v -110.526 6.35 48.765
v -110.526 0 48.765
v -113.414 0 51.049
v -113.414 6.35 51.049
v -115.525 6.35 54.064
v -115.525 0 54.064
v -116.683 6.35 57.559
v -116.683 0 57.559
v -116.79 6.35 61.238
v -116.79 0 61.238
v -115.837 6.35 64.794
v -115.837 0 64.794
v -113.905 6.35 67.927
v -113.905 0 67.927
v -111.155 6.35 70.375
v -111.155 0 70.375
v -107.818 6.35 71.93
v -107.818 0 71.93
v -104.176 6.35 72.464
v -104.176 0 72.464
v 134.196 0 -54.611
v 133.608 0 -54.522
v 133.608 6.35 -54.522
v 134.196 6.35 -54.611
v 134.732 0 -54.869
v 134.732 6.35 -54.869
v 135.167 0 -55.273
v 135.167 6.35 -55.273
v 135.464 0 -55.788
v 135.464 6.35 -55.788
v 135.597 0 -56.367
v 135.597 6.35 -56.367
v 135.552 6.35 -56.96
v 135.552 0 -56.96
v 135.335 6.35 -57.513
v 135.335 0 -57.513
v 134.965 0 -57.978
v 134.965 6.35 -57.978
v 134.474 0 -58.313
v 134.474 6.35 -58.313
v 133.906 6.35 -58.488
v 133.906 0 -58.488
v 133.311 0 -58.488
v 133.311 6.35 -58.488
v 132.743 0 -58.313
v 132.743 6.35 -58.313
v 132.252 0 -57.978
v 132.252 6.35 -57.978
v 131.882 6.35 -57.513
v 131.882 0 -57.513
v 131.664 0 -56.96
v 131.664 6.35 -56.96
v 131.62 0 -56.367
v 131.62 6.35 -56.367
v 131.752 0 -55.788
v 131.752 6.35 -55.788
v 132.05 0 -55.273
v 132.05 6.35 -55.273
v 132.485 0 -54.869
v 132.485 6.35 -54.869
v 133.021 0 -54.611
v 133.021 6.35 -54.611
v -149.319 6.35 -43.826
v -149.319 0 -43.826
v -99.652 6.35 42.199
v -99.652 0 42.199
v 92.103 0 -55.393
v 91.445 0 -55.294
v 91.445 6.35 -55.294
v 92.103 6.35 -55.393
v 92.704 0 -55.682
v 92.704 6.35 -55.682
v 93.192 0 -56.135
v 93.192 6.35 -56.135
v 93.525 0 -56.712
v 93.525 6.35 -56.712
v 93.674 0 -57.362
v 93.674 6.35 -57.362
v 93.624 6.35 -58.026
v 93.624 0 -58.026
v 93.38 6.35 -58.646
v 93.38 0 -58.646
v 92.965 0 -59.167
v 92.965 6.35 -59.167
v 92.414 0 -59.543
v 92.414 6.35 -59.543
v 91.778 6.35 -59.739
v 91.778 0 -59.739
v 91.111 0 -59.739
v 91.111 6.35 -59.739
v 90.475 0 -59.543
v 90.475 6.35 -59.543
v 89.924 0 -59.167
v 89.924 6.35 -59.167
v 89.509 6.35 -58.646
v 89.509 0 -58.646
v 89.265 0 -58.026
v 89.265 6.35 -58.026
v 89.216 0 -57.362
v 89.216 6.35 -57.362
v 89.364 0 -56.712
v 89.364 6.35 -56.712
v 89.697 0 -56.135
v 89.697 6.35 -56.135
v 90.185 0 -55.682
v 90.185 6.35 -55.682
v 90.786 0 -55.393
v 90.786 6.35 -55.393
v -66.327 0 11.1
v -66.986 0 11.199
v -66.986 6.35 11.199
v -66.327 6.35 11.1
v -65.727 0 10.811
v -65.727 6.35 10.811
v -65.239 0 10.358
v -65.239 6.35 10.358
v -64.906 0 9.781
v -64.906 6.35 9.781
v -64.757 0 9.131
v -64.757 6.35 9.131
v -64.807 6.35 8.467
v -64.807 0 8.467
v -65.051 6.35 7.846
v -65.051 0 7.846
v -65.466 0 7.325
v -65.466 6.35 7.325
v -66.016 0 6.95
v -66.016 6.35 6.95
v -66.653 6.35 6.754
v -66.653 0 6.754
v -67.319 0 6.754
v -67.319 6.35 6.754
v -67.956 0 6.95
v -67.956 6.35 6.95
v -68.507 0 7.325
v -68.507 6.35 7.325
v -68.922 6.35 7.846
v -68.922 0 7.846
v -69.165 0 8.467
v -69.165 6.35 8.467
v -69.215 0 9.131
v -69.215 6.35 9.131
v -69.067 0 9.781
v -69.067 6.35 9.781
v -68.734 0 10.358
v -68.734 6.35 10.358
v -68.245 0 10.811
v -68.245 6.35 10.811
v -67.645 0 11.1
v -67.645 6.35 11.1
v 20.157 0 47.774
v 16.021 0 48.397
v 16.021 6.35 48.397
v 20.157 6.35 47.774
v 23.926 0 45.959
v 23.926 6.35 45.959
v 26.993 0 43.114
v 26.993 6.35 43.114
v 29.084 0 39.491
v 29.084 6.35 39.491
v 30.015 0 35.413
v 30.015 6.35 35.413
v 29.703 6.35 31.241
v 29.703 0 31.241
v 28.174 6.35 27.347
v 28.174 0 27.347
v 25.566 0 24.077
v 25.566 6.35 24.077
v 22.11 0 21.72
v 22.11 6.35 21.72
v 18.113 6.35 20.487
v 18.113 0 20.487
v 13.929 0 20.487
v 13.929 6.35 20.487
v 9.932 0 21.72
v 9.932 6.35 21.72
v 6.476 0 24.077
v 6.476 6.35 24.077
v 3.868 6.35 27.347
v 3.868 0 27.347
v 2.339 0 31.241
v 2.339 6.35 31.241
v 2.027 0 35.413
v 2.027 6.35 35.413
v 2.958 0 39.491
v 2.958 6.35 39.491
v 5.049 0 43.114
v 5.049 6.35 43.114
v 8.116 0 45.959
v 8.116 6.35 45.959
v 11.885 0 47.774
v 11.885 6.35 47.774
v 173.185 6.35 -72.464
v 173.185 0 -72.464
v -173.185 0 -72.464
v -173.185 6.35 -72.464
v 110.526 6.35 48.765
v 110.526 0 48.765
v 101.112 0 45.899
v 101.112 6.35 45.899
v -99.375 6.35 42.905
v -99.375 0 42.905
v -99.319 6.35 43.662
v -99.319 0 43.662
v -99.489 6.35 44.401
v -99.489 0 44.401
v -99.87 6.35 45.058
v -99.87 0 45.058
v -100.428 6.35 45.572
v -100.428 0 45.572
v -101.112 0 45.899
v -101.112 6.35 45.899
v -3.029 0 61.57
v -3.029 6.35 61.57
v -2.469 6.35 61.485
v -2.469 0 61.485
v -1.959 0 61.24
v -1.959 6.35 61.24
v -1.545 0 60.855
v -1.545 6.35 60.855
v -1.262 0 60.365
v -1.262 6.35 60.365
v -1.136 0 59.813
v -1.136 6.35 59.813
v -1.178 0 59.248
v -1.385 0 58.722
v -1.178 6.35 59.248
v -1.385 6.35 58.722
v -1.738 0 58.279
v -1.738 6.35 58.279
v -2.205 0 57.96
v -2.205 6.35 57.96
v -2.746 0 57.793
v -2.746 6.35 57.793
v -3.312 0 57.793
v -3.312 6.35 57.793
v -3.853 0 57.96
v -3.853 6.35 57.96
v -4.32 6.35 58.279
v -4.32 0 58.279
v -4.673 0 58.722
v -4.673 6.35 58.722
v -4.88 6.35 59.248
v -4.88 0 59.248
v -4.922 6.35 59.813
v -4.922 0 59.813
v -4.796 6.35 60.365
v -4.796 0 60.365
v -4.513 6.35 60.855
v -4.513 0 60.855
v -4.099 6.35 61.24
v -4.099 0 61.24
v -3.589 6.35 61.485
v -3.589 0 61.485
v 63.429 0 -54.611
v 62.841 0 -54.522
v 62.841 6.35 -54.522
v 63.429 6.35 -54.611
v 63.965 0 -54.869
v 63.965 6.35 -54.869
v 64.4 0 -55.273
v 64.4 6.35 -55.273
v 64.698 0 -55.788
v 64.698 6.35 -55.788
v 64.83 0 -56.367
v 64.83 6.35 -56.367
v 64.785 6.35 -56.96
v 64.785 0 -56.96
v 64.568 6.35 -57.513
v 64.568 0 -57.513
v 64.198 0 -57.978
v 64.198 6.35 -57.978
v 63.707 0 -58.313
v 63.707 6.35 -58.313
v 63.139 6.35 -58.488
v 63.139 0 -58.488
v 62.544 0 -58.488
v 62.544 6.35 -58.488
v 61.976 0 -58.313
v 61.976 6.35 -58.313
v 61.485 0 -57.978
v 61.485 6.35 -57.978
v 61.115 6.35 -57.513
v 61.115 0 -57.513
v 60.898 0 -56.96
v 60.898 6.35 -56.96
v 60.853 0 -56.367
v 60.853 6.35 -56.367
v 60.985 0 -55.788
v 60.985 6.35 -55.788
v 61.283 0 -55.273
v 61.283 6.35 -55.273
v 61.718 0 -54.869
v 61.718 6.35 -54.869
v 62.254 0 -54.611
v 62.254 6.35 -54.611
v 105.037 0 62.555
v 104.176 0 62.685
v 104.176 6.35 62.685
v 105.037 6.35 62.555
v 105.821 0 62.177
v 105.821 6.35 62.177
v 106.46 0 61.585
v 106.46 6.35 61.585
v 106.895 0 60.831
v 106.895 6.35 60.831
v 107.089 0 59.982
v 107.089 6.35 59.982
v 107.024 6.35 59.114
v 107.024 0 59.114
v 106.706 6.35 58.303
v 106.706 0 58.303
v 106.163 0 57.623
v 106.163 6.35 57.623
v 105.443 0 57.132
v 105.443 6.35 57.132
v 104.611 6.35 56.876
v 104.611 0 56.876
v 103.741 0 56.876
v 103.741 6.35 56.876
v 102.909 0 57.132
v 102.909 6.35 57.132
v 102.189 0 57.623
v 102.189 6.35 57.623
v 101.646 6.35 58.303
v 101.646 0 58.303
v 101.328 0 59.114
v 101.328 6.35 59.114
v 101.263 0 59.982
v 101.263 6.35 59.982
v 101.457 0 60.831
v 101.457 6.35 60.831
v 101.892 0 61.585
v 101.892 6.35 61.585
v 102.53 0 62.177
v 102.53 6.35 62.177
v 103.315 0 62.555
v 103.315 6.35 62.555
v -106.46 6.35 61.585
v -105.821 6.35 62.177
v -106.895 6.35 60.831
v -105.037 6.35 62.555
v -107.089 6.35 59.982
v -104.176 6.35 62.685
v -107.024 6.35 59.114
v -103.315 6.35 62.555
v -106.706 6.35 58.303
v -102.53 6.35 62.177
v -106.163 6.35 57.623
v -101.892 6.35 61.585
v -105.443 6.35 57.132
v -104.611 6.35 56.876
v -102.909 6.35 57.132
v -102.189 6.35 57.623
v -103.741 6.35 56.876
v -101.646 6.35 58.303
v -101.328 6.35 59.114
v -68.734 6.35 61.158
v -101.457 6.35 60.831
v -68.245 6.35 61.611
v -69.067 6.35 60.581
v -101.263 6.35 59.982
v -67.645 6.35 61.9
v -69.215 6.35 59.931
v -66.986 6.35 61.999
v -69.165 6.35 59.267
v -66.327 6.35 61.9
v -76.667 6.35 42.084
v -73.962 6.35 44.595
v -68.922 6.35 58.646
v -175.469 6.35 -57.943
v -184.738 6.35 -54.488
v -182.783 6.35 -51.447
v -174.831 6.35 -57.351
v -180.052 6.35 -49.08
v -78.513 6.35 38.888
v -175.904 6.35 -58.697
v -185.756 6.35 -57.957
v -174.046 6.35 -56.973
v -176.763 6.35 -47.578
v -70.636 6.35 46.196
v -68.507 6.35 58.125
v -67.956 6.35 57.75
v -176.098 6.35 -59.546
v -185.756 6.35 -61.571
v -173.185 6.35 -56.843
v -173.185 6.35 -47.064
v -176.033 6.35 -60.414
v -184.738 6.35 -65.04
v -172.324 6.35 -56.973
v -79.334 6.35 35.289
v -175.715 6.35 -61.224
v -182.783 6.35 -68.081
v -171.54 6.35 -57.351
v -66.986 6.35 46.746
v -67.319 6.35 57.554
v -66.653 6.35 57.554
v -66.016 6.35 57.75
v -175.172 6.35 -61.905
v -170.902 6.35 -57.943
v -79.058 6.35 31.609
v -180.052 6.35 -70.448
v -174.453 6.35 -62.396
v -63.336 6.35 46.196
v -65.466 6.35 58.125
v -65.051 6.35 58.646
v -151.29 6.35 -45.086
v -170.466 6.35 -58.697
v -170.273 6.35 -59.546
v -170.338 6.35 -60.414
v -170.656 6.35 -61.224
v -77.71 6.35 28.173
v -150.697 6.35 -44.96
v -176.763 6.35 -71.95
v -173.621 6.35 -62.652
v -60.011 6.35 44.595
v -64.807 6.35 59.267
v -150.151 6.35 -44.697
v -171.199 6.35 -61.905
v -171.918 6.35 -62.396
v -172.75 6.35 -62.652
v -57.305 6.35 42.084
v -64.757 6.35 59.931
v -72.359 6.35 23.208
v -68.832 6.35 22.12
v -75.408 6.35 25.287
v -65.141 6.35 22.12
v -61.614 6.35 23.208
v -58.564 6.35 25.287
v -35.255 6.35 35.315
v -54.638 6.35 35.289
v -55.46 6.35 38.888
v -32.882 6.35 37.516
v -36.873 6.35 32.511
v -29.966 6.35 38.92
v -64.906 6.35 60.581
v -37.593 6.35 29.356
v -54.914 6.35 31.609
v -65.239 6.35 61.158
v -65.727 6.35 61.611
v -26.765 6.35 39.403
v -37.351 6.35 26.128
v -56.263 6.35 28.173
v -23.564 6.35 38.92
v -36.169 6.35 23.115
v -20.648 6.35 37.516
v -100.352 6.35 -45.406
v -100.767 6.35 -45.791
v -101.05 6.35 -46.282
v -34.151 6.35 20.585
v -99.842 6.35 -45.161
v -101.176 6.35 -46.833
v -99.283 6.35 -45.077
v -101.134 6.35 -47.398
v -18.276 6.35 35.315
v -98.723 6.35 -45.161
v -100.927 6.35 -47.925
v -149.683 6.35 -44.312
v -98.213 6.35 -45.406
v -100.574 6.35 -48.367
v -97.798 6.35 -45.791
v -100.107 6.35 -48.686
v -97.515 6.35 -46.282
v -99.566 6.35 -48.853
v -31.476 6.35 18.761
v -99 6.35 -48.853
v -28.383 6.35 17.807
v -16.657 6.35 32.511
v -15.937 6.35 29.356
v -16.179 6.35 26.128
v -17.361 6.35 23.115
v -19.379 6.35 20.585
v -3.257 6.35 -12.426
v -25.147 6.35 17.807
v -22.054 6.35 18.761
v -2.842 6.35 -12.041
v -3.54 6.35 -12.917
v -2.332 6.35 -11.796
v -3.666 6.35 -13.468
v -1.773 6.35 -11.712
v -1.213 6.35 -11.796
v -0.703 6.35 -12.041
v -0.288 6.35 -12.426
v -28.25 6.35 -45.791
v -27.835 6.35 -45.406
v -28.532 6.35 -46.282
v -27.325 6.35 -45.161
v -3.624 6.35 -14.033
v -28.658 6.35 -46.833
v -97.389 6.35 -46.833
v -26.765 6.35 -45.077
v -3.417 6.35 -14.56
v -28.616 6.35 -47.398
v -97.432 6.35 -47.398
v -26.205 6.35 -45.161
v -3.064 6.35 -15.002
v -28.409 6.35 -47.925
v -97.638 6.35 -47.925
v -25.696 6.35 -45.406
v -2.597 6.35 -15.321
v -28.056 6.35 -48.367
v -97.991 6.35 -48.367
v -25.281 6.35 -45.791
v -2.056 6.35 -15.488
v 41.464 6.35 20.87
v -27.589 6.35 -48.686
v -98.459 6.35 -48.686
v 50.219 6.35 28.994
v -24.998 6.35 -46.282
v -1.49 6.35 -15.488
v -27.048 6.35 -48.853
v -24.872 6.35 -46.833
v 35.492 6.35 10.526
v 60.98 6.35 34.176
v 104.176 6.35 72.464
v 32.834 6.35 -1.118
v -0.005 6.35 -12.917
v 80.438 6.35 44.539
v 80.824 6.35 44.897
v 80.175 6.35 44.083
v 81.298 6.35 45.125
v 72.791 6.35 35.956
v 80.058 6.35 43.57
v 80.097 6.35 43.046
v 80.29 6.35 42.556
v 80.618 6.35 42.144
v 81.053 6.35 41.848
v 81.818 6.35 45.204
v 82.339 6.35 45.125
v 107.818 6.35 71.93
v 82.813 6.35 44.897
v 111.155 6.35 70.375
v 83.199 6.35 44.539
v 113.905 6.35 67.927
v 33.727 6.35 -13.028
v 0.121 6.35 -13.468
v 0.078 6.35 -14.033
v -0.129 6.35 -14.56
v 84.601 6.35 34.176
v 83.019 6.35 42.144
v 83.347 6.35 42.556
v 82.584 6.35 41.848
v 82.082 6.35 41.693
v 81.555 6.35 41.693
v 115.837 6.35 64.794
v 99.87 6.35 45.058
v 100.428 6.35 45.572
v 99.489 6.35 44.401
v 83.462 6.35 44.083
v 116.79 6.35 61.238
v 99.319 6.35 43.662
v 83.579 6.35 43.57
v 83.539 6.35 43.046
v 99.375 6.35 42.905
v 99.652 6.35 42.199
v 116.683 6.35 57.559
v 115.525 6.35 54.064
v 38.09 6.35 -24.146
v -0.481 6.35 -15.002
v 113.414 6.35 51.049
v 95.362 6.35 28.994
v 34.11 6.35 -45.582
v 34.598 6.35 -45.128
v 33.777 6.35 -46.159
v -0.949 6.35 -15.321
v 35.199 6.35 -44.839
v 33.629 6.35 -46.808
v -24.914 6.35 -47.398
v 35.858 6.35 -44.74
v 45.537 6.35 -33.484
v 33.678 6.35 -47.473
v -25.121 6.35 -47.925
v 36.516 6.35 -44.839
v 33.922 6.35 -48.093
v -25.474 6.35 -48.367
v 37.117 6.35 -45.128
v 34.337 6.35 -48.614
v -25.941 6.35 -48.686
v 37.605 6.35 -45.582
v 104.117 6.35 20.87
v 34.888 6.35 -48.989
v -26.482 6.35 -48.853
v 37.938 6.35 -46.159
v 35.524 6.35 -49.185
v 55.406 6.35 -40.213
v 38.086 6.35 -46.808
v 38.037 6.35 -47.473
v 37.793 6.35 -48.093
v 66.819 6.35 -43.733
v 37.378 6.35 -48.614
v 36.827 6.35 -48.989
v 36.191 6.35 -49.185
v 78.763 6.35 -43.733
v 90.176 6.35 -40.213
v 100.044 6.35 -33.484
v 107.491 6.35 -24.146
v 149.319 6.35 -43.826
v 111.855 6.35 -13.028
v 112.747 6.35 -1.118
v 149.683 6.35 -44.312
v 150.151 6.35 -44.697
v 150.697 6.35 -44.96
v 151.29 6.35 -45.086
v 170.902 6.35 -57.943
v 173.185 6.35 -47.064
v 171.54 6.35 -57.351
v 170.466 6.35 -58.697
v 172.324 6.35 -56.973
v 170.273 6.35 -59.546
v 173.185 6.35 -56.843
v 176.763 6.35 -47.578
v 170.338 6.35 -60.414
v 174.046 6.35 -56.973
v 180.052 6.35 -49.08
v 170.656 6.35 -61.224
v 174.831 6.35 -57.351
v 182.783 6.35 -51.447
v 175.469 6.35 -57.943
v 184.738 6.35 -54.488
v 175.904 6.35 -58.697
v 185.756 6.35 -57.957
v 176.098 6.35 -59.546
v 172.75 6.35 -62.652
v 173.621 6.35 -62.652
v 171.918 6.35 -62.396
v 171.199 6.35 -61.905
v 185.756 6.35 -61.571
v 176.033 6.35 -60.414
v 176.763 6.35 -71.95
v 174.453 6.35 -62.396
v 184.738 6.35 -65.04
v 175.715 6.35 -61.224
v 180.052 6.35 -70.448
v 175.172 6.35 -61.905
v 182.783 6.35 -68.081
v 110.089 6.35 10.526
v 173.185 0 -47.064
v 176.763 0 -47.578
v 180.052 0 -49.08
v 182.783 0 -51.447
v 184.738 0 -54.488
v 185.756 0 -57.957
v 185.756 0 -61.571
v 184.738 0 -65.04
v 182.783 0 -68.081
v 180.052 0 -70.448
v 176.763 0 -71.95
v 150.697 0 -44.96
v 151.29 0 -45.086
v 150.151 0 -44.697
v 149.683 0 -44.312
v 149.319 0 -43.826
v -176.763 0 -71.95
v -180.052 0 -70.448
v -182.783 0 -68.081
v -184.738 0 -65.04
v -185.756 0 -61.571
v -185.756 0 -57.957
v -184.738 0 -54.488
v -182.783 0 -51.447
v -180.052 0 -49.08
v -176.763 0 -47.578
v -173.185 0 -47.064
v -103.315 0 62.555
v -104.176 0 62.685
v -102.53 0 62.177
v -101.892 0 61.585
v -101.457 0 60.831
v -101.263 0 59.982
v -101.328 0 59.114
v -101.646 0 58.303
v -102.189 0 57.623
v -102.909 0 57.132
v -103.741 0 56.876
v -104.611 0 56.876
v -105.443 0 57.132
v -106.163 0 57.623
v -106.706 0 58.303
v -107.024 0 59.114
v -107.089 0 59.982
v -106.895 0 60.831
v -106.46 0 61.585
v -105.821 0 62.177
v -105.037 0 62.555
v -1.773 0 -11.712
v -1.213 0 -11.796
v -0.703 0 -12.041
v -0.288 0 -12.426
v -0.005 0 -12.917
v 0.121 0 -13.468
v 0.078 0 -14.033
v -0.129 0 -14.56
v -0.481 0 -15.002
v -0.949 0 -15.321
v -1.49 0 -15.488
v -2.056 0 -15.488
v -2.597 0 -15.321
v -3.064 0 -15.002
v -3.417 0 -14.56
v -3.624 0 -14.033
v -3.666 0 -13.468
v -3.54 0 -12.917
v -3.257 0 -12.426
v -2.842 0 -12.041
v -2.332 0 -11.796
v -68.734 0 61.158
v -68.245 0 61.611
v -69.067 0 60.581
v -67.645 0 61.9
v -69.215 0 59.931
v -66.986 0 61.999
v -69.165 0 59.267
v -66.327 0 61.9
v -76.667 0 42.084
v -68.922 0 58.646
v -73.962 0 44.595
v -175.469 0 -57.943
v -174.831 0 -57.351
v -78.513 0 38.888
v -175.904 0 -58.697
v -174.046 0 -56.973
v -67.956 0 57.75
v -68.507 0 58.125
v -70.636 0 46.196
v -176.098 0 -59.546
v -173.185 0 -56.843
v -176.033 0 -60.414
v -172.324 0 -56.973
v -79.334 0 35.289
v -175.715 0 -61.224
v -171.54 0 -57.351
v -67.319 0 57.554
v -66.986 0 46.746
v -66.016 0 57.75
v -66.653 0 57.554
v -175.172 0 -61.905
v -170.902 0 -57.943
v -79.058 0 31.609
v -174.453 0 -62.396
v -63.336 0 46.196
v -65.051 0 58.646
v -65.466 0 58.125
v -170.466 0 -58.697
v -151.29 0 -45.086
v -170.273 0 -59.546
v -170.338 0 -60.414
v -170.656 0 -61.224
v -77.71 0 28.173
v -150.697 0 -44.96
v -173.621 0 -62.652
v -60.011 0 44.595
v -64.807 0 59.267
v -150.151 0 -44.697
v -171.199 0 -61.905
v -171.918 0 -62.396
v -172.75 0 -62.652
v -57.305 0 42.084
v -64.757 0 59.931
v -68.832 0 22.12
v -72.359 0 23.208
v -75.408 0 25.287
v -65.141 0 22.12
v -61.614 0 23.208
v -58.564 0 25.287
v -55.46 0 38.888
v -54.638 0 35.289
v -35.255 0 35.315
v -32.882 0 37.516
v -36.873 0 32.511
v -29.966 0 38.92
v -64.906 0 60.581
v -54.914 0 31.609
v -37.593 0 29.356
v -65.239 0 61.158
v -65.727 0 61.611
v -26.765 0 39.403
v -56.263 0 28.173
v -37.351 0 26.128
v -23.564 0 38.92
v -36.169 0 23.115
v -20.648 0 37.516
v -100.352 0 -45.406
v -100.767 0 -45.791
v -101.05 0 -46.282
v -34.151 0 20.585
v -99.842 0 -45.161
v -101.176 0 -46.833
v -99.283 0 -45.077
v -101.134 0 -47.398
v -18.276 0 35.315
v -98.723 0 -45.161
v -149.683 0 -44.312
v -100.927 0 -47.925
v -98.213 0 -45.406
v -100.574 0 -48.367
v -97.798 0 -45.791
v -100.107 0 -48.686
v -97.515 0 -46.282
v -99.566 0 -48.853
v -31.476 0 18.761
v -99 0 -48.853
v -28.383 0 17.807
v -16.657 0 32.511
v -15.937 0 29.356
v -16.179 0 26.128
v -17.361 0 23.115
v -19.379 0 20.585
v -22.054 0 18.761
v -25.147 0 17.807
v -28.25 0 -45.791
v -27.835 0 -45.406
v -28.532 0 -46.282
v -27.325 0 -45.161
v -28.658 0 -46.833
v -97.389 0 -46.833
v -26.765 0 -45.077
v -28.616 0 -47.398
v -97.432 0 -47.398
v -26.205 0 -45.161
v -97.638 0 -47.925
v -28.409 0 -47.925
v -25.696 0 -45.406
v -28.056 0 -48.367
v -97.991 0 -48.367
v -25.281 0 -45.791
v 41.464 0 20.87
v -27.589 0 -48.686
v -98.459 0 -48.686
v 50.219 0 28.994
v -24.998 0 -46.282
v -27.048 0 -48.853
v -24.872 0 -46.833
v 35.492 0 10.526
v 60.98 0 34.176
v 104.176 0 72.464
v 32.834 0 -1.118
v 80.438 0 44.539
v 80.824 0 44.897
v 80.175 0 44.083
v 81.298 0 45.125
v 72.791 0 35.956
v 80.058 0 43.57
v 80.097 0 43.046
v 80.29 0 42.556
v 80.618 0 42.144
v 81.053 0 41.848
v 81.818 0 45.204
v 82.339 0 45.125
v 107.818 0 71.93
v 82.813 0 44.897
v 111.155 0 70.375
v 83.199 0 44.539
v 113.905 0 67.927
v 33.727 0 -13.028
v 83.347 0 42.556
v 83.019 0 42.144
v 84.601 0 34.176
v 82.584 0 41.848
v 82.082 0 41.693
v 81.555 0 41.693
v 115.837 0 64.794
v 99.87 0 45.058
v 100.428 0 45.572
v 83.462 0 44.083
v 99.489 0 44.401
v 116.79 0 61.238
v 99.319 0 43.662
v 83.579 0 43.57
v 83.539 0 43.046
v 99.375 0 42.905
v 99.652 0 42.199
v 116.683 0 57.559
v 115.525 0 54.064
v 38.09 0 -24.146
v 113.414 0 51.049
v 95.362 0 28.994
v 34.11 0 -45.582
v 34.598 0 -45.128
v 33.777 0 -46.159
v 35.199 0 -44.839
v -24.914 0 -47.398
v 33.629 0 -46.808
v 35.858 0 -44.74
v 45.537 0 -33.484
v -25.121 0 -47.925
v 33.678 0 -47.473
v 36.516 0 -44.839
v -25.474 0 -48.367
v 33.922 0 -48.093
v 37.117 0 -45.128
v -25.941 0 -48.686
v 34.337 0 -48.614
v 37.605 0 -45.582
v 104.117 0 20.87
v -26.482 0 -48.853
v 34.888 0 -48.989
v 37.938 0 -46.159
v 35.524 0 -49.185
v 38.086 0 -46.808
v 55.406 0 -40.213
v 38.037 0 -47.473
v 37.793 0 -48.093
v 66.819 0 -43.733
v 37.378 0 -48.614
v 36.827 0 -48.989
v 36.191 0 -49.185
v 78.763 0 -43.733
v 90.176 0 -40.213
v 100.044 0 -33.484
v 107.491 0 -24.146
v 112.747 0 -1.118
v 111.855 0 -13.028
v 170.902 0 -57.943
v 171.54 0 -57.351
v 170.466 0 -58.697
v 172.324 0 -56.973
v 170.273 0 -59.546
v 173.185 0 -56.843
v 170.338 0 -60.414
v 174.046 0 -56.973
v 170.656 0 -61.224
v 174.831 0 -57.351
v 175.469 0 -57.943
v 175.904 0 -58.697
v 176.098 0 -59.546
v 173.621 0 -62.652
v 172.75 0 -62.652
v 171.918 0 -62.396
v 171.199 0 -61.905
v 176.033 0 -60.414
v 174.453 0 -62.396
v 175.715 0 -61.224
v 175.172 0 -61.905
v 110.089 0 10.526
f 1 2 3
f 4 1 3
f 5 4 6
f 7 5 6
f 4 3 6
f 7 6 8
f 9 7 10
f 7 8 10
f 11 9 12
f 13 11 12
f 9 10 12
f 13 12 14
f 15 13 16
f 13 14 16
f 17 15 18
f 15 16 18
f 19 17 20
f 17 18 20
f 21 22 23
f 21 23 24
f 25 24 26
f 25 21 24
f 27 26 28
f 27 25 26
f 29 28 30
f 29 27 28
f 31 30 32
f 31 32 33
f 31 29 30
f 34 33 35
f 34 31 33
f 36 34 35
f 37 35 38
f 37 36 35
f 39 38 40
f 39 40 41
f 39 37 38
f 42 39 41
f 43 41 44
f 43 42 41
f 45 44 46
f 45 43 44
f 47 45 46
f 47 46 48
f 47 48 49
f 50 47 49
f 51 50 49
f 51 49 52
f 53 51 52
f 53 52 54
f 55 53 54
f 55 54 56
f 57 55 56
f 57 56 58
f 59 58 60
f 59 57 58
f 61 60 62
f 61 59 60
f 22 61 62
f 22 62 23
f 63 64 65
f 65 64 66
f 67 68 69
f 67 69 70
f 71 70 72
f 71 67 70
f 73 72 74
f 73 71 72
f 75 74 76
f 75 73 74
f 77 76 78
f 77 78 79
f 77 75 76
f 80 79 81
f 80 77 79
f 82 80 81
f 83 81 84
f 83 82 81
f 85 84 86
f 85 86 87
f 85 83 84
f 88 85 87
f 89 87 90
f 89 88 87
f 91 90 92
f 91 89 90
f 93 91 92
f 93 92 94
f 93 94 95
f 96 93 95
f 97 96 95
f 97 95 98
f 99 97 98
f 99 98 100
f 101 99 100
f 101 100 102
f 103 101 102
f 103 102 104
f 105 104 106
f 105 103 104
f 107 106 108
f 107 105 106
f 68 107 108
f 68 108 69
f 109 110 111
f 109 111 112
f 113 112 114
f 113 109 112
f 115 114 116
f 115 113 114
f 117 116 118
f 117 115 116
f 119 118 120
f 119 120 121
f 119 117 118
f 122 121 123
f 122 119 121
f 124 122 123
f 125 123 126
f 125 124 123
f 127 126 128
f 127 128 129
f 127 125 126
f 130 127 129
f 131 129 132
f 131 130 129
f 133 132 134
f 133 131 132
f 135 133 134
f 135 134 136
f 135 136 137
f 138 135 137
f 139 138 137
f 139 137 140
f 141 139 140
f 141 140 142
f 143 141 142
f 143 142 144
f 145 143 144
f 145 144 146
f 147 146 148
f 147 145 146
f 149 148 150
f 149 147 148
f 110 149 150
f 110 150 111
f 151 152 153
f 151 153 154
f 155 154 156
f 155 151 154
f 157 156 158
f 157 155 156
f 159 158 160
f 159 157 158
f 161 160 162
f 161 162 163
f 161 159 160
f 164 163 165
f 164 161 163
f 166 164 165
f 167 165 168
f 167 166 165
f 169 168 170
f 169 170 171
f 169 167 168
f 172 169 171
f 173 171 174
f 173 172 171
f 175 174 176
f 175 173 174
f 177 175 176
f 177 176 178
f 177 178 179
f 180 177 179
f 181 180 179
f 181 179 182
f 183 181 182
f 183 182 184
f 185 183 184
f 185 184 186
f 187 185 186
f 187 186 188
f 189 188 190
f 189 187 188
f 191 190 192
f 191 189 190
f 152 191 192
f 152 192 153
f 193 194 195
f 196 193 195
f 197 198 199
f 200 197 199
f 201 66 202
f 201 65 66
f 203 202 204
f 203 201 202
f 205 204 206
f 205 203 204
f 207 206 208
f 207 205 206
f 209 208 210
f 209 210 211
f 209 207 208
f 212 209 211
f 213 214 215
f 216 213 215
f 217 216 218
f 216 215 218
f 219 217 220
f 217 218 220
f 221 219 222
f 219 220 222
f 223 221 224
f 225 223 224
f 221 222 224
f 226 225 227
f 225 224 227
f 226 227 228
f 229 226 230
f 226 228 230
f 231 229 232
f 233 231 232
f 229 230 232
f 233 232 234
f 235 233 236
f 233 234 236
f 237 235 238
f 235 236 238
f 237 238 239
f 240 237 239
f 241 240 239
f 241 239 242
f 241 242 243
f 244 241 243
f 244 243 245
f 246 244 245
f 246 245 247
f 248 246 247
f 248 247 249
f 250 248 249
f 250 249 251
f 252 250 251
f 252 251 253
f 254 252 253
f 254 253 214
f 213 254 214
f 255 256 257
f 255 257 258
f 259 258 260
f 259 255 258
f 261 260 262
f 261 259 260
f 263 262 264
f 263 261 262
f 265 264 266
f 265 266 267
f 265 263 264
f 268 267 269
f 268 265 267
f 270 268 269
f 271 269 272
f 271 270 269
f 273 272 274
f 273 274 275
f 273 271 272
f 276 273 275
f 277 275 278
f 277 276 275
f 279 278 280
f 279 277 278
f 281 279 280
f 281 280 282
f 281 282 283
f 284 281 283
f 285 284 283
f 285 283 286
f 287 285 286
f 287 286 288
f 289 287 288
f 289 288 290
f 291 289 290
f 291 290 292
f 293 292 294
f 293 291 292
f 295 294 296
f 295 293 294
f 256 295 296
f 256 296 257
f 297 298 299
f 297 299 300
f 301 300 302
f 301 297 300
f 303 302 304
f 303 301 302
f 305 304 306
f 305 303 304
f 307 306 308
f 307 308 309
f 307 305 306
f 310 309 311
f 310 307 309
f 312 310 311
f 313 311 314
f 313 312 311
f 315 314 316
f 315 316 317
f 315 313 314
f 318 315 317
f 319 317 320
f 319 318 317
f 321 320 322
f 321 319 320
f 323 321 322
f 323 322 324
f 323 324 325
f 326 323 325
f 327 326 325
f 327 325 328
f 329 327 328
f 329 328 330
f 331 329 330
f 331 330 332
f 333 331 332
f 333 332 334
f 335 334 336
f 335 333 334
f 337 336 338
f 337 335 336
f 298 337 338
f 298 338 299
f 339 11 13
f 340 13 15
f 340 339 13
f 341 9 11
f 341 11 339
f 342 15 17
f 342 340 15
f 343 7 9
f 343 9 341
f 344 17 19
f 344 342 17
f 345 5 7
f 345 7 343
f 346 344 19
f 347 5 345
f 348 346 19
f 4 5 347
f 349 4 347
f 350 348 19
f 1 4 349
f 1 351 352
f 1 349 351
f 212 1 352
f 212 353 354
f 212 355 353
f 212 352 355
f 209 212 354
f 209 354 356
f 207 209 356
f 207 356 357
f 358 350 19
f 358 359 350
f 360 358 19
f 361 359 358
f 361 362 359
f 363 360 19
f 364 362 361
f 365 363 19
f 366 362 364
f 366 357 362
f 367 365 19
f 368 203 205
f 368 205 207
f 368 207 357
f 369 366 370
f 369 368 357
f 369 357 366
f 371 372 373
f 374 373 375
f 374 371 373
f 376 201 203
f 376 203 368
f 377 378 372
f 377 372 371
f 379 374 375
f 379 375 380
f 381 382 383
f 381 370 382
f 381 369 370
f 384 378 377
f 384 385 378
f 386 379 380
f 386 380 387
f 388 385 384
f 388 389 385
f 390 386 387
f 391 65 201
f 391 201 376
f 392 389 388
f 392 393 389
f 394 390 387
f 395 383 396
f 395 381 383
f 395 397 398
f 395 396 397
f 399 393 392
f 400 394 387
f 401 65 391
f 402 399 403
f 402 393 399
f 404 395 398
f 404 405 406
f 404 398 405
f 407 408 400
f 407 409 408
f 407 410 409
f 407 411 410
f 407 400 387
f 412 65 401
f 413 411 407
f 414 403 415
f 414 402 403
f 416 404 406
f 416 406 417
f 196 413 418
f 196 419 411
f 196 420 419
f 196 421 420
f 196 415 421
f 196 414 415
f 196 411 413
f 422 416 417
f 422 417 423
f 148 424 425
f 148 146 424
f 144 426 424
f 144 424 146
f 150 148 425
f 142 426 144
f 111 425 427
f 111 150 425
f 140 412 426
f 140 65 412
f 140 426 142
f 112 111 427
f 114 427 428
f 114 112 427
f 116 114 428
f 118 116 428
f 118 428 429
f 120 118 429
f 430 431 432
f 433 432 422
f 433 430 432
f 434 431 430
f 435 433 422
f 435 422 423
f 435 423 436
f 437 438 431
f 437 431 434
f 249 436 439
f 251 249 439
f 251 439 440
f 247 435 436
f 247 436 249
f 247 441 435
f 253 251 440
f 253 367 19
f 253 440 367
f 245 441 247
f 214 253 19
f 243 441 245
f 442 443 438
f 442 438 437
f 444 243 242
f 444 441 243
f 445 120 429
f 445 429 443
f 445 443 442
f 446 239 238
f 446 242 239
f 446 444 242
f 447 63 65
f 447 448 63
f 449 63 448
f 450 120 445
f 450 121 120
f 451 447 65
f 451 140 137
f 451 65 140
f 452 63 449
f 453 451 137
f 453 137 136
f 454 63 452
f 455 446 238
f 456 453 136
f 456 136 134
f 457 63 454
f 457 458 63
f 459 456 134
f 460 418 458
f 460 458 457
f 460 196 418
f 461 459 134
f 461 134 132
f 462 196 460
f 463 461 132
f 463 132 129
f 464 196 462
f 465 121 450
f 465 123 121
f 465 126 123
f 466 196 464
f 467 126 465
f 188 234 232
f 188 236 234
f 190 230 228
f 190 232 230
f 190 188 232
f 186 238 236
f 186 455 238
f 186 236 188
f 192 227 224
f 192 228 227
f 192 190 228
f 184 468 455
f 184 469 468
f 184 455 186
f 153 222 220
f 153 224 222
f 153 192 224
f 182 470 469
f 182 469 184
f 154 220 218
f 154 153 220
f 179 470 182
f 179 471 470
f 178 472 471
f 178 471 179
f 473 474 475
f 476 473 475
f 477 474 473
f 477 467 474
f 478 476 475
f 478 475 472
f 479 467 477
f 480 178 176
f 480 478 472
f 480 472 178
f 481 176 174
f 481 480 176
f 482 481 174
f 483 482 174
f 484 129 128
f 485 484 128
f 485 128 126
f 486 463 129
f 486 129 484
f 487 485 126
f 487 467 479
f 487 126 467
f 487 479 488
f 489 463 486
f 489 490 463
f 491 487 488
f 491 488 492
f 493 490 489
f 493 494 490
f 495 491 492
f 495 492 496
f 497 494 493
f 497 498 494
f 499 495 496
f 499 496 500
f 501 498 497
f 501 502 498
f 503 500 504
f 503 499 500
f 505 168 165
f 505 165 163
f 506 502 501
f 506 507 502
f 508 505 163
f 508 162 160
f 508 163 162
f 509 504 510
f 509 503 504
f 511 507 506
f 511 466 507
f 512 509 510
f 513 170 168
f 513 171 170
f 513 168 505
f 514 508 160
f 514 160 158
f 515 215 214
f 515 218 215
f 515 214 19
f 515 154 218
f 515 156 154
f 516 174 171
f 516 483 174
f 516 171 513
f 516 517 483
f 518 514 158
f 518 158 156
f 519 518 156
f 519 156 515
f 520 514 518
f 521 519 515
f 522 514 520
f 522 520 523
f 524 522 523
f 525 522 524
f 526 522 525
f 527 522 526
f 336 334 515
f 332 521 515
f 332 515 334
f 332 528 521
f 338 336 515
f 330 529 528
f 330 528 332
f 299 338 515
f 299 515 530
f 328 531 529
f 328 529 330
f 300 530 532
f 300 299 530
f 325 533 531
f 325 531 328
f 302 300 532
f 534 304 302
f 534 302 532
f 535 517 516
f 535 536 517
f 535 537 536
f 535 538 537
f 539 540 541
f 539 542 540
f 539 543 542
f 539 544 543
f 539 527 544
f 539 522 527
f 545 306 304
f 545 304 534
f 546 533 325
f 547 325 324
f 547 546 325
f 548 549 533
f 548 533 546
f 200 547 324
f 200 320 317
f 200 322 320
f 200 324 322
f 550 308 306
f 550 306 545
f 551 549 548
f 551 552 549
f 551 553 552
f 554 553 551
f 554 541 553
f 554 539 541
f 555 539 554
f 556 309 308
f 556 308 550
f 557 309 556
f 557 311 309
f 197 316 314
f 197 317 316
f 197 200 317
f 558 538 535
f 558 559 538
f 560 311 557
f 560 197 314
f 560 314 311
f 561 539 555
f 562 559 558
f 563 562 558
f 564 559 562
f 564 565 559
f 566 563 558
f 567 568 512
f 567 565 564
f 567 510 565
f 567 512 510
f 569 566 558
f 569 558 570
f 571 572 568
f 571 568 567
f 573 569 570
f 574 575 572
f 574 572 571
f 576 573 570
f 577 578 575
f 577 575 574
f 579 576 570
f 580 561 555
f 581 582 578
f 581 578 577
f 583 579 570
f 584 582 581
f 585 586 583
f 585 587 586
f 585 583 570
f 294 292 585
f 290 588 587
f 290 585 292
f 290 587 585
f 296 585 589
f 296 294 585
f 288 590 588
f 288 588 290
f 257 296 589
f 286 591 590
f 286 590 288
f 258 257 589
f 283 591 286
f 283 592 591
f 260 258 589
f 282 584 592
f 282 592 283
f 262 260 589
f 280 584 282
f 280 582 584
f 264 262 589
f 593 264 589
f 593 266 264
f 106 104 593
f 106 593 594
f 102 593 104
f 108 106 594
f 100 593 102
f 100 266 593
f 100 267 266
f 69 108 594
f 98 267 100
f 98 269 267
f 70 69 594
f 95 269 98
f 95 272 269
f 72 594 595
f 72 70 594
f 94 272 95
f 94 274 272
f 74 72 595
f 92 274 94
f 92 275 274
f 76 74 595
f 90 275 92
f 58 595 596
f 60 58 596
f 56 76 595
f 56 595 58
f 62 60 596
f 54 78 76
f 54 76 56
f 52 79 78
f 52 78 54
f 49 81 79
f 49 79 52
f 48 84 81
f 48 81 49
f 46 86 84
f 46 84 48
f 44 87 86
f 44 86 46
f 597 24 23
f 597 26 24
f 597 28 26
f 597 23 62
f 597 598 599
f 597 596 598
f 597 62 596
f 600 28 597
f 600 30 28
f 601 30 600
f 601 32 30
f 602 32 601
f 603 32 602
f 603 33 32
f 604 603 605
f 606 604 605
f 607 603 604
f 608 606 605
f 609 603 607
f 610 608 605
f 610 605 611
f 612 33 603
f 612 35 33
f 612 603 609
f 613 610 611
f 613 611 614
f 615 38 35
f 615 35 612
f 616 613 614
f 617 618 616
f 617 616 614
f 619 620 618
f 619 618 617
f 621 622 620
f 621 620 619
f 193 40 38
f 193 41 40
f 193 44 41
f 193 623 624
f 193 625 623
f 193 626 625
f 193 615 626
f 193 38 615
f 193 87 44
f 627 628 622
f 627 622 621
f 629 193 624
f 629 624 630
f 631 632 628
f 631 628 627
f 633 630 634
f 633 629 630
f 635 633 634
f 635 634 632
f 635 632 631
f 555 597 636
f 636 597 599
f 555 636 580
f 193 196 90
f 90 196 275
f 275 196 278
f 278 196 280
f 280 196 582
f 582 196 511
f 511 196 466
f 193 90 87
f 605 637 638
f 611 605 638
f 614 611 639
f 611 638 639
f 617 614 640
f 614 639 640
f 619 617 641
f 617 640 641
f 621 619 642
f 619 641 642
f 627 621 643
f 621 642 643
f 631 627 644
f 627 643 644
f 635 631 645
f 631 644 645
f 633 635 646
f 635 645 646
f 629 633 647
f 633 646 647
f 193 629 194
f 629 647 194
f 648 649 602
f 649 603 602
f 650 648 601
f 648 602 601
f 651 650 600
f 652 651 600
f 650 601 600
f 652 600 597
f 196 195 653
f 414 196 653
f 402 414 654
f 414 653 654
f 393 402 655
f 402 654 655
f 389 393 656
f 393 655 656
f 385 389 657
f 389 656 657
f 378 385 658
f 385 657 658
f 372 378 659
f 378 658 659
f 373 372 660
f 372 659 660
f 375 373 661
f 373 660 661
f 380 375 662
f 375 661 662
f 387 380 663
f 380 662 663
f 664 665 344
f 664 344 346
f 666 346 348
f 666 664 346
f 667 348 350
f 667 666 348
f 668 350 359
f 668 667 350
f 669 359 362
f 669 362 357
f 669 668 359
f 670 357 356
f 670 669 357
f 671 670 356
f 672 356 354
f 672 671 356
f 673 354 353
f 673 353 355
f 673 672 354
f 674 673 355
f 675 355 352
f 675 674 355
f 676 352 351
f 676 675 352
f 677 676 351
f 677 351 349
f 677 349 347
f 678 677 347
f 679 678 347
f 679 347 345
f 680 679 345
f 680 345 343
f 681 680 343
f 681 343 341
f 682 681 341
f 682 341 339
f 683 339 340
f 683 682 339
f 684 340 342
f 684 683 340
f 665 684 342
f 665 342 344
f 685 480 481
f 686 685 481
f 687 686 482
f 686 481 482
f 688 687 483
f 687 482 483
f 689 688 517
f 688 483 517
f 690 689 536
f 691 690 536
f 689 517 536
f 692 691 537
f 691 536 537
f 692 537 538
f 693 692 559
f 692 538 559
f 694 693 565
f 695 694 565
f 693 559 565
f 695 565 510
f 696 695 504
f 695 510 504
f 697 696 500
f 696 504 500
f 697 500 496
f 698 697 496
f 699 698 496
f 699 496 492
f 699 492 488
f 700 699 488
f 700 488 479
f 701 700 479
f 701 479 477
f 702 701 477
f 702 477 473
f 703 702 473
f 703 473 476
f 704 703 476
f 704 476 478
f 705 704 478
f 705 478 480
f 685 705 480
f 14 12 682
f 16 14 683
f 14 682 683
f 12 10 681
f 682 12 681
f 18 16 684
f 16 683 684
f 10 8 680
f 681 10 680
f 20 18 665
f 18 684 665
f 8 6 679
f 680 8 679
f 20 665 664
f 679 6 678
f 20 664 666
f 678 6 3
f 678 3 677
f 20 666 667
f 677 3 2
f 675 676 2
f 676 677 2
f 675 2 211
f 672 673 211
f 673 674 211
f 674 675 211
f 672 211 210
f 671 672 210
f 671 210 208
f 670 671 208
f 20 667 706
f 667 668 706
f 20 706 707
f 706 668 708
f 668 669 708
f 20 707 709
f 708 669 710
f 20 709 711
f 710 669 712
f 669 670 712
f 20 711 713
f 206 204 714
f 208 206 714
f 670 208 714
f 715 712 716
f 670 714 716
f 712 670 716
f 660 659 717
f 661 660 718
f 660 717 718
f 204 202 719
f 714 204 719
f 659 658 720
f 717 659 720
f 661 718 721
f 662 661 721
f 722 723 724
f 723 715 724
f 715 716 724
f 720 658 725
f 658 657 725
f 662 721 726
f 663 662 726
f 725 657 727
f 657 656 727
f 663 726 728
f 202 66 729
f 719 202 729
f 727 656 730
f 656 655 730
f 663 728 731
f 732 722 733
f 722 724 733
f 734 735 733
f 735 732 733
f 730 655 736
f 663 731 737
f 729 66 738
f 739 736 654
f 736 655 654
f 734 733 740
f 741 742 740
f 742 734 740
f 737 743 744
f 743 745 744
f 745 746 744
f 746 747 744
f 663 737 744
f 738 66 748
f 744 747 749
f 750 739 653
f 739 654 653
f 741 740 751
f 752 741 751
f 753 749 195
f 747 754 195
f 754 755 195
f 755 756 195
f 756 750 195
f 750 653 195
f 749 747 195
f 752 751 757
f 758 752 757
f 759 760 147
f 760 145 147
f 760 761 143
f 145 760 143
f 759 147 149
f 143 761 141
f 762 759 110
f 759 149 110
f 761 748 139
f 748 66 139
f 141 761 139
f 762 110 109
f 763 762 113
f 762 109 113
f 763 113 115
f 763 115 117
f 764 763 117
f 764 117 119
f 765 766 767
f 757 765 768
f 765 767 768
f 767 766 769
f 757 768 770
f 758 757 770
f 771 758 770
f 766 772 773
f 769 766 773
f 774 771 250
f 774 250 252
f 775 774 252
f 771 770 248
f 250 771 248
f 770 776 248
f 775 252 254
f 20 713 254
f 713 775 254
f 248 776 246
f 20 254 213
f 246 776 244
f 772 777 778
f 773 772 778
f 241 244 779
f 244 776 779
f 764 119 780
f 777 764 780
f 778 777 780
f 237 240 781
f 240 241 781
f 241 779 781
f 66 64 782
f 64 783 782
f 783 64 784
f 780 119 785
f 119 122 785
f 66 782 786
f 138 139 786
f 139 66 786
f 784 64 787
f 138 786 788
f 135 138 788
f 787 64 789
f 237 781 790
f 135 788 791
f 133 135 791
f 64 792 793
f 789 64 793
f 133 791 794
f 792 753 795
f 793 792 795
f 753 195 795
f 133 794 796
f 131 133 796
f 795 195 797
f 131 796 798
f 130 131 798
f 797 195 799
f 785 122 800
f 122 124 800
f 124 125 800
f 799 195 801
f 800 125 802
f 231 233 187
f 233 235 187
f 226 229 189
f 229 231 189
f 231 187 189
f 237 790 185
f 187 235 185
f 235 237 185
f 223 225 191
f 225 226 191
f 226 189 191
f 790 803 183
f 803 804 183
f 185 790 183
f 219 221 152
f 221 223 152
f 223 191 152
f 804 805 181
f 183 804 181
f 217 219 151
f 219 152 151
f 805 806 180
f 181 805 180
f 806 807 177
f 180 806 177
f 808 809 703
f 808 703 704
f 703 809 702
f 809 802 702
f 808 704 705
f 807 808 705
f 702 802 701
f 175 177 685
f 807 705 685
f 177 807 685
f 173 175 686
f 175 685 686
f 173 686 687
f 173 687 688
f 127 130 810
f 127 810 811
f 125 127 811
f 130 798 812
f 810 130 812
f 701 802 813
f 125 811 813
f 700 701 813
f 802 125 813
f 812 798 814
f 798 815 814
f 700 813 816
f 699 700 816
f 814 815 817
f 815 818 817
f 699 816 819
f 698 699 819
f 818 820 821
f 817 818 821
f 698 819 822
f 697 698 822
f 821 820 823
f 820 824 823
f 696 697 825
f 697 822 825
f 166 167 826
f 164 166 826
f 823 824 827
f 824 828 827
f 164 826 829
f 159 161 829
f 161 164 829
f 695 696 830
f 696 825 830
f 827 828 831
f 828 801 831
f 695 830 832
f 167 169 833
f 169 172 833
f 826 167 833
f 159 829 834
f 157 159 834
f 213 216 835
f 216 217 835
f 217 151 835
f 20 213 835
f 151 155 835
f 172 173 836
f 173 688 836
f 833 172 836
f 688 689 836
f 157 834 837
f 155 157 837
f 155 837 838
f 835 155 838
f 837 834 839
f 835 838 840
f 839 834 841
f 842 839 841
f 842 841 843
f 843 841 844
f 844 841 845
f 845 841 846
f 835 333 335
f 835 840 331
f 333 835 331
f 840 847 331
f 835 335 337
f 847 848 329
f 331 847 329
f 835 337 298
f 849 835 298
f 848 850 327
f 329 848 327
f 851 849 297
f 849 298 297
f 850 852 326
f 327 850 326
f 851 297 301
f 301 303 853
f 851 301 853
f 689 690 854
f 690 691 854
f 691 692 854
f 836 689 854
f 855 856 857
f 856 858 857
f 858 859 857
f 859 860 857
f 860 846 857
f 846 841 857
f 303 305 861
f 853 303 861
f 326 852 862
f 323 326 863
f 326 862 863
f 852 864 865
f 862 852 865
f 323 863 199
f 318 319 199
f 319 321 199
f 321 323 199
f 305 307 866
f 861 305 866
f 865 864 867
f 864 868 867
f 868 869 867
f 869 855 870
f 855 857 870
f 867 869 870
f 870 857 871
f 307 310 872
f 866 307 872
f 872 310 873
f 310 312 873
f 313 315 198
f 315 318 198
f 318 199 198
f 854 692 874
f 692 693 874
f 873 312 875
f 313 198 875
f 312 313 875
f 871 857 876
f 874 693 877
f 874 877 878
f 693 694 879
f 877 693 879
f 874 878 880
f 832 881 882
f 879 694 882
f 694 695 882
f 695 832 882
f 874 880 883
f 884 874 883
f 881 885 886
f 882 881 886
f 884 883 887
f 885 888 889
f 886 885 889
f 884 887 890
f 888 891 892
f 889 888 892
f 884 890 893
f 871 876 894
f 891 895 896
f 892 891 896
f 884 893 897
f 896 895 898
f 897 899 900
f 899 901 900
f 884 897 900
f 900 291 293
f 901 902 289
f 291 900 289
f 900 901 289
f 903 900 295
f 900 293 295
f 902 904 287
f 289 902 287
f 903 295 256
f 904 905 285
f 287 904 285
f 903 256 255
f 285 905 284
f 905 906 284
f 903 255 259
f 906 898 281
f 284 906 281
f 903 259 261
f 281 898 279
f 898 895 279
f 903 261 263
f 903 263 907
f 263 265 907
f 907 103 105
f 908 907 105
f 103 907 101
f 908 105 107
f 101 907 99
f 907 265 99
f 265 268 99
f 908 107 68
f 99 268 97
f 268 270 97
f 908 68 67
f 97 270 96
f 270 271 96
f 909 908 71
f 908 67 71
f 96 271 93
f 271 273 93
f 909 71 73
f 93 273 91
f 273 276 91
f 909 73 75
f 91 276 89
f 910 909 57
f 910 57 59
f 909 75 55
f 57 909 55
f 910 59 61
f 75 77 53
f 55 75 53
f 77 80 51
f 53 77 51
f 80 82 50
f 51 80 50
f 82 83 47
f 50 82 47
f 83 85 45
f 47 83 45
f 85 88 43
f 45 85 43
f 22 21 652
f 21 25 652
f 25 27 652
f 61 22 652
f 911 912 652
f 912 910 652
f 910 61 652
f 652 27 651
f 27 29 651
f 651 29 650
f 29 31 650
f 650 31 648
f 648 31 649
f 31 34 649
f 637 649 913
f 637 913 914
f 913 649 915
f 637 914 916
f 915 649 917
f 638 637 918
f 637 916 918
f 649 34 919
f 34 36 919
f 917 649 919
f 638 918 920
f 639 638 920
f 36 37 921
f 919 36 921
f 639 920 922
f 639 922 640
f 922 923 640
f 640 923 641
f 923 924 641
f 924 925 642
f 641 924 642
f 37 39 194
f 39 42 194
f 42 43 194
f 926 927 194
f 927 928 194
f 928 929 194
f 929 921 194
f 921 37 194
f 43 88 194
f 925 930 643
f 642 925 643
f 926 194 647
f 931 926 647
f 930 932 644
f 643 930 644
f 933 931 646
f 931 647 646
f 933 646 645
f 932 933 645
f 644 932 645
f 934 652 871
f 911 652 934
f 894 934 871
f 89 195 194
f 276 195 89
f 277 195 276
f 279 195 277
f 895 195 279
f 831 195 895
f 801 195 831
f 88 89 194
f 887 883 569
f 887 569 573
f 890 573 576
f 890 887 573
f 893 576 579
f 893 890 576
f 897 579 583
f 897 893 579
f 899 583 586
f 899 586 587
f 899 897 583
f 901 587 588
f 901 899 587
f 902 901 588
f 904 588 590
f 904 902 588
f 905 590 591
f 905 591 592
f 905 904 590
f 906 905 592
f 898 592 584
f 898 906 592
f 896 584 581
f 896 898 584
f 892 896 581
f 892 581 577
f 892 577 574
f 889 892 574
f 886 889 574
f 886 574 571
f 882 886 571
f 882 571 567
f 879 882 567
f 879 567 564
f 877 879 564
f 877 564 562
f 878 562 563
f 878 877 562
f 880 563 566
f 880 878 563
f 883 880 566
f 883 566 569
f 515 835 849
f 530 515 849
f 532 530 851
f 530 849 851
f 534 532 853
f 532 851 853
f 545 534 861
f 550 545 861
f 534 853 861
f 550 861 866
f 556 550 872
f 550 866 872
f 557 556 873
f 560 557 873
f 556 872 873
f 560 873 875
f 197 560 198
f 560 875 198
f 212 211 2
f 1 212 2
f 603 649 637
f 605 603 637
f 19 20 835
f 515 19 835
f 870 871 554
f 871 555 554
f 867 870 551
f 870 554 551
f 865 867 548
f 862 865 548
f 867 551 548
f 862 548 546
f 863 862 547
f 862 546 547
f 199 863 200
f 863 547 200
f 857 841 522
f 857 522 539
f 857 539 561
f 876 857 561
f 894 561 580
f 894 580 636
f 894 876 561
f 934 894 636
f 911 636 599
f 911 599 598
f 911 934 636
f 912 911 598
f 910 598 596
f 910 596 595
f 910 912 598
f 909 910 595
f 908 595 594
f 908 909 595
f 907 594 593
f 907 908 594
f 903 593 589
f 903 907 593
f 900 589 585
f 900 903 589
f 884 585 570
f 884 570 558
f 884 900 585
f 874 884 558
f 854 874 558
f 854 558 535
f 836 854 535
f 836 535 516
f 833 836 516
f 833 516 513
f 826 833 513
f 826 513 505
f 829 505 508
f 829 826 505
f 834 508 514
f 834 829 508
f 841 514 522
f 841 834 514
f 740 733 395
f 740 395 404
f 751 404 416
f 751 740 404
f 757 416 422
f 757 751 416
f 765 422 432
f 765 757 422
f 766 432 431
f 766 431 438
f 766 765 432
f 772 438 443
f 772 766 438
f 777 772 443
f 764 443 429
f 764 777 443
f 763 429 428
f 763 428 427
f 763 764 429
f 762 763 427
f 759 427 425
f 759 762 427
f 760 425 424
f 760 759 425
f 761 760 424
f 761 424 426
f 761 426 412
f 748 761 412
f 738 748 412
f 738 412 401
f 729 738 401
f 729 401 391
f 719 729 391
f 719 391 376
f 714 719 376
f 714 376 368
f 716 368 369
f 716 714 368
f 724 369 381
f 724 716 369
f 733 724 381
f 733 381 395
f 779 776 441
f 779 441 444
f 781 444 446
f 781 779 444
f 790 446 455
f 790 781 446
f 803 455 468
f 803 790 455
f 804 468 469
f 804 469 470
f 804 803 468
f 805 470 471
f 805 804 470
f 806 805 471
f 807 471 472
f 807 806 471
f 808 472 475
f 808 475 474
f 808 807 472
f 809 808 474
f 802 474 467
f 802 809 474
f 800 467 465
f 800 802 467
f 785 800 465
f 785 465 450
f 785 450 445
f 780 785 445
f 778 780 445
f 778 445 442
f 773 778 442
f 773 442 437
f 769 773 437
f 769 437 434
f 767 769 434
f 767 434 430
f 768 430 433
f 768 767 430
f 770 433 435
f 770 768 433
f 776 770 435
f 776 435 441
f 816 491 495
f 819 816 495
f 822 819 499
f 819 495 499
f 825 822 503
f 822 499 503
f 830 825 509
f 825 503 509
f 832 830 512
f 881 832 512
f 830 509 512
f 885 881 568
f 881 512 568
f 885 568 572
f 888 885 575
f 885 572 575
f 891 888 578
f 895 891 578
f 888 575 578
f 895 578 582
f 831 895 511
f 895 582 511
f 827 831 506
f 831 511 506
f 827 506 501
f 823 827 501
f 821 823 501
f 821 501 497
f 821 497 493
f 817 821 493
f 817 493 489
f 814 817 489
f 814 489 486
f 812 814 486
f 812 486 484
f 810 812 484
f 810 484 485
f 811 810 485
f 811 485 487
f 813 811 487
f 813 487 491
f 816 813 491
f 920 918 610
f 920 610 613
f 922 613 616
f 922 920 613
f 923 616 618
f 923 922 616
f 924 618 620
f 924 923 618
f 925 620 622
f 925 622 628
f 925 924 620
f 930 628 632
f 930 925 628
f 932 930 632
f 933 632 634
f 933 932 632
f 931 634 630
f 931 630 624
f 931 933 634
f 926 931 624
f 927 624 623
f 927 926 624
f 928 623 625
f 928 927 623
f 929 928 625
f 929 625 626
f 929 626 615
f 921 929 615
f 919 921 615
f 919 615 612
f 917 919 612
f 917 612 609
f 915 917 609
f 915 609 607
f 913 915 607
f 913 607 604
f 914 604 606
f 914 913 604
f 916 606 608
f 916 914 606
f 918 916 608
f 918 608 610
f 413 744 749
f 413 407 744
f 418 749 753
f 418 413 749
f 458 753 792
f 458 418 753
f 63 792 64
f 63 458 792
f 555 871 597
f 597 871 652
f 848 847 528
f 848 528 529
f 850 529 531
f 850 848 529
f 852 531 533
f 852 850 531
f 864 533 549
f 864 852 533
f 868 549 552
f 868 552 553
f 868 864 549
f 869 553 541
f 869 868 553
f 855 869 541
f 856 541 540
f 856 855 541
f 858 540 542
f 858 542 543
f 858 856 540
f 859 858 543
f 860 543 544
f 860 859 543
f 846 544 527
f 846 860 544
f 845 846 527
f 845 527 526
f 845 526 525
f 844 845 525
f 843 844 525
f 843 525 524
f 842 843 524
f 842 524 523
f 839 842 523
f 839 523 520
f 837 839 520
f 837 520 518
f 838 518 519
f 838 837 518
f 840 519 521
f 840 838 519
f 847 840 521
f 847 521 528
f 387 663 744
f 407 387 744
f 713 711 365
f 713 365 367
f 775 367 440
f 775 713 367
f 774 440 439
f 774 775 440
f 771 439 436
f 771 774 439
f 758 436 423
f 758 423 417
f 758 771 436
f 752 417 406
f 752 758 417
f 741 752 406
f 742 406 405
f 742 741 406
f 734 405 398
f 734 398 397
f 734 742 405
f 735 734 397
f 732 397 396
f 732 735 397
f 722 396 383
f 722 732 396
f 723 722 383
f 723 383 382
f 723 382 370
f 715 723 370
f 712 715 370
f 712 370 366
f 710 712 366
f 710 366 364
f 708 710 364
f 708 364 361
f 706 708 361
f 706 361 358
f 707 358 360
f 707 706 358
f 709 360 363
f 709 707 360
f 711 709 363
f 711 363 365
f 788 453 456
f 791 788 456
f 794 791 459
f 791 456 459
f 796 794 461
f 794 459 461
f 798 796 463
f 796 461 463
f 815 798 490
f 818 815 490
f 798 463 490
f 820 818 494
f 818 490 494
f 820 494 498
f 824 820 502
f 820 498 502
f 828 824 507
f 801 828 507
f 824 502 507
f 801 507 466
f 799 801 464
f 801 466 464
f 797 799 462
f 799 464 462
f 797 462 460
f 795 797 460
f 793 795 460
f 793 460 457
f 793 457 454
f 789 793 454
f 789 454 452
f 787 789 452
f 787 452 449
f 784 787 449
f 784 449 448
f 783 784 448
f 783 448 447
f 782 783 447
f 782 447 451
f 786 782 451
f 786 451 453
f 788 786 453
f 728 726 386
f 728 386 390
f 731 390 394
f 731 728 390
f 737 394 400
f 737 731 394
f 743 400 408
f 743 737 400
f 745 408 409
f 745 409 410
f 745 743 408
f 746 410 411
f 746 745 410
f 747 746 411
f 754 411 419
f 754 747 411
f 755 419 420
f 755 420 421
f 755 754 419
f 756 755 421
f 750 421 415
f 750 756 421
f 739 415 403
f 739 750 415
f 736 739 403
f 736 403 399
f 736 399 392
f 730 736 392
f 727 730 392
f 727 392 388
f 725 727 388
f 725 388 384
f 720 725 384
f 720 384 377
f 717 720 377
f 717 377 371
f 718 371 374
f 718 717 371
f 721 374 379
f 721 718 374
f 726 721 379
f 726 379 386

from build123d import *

# Parameters (mm, degrees)
SKETCH1_R           = 2.921
SKETCH1_R_2         = 2.2352
SKETCH1_R_3         = 12.3825
SKETCH1_R_4         = 10.8585
SKETCH1_R_5         = 14.0335
SKETCH1_R_6         = 1.7653
SKETCH1_R_7         = 40.0685
SKETCH1_R_8         = 1.9939
BOSS_EXTRUDE1_DEPTH = 6.35
SKETCH2_R           = 1.89865
CUT_EXTRUDE1_DEPTH  = 200.611442467
FILLET1_R           = 2.54


with BuildPart() as part:
    # Sketch1 → Boss-Extrude1 (new body)
    with BuildSketch(Plane(origin=(0, 0, 0), x_dir=(1, 0, 0), z_dir=(0, 1, 0))):
        with BuildLine():
            ThreePointArc((-173.185393891, 72.463962089), (-185.885393891, 59.763962089), (-173.185393891, 47.063962089))
            Line((-173.185393891, 47.063962089), (-149.978045472, 44.967655518))
            Line((-149.978045472, 44.967655518), (-98.053869436, -44.967655518))
            Line((-98.053869436, -44.967655518), (-110.525914692, -48.765439461))
            ThreePointArc((-110.525914692, -48.765439461), (-116.443172686, -63.050963961), (-104.175914692, -72.463962089))
            Line((-104.175914692, -72.463962089), (104.175914692, -72.463962089))
            ThreePointArc((104.175914692, -72.463962089), (116.443172686, -63.050963961), (110.525914692, -48.765439461))
            Line((110.525914692, -48.765439461), (98.053869436, -44.967655518))
            Line((98.053869436, -44.967655518), (149.978045472, 44.967655518))
            Line((149.978045472, 44.967655518), (173.185393891, 47.063962089))
            ThreePointArc((173.185393891, 47.063962089), (185.885393891, 59.763962089), (173.185393891, 72.463962089))
            Line((173.185393891, 72.463962089), (-173.185393891, 72.463962089))
        make_face()
        with Locations(Location((173.185393891, 59.763962089, 0), (0, 0, 270))):
            Circle(SKETCH1_R, mode=Mode.SUBTRACT)
        with Locations(Location((-104.175914692, -59.763962089, 0), (0, 0, 270))):
            Circle(SKETCH1_R, mode=Mode.SUBTRACT)
        with Locations(Location((-66.986243512, -59.763962089, 0), (0, 0, 270))):
            Circle(SKETCH1_R_2, mode=Mode.SUBTRACT)
        with Locations(Location((-66.986243512, -34.363962089, 0), (0, 0, 270))):
            Circle(SKETCH1_R_3, mode=Mode.SUBTRACT)
        with Locations(Location((-26.765079253, -28.544379147, 0), (0, 0, 270))):
            Circle(SKETCH1_R_4, mode=Mode.SUBTRACT)
        with Locations(Location((-66.986243512, -8.963962089, 0), (0, 0, 270))):
            Circle(SKETCH1_R_2, mode=Mode.SUBTRACT)
        with Locations(Location((16.020956488, -34.363962089, 0), (0, 0, 270))):
            Circle(SKETCH1_R_5, mode=Mode.SUBTRACT)
        with Locations(Location((81.81843836, -43.438397329, 0), (0, 0, 270))):
            Circle(SKETCH1_R_6, mode=Mode.SUBTRACT)
        with Locations(Location((-173.185393891, 59.763962089, 0), (0, 0, 270))):
            Circle(SKETCH1_R, mode=Mode.SUBTRACT)
        with Locations(Location((72.790674122, 4.112206637, 0), (0, 0, 270))):
            Circle(SKETCH1_R_7, mode=Mode.SUBTRACT)
        with Locations(Location((35.857528241, 46.975232392, 0), (0, 0, 270))):
            Circle(SKETCH1_R_2, mode=Mode.SUBTRACT)
        with Locations(Location((62.841482041, 56.516110851, 0), (0, 0, 270))):
            Circle(SKETCH1_R_8, mode=Mode.SUBTRACT)
        with Locations(Location((91.444570369, 57.528762089, 0), (0, 0, 270))):
            Circle(SKETCH1_R_2, mode=Mode.SUBTRACT)
        with Locations(Location((133.608398757, 56.516110851, 0), (0, 0, 270))):
            Circle(SKETCH1_R_8, mode=Mode.SUBTRACT)
        with Locations(Location((104.175914692, -59.763962089, 0), (0, 0, 270))):
            Circle(SKETCH1_R, mode=Mode.SUBTRACT)
    extrude(amount=BOSS_EXTRUDE1_DEPTH)

    # Sketch2 → Cut-Extrude1 (cut, through all)
    with BuildSketch(Plane(origin=(0, 6.35, 0), x_dir=(1, 0, 0), z_dir=(0, 1, 0))):
        with Locations(Location((-99.282752504, 46.975232392, 0), (0, 0, 270))):
            Circle(SKETCH2_R)
        with Locations(Location((-26.765079253, 46.975232392, 0), (0, 0, 270))):
            Circle(SKETCH2_R)
        with Locations(Location((-3.029043512, -59.670924273, 0), (0, 0, 270))):
            Circle(SKETCH2_R)
        with Locations(Location((-1.772813917, 13.610193745, 0), (0, 0, 270))):
            Circle(SKETCH2_R)
    extrude(amount=-CUT_EXTRUDE1_DEPTH, mode=Mode.SUBTRACT)

    # Fillet1
    fillet1_edges = [part.edges().sort_by_distance(p)[0] for p in [
        (149.978045472, 3.175, -44.967655518),
        (98.053869436, 3.175, 44.967655518),
        (-98.053869436, 3.175, 44.967655518),
        (-149.978045472, 3.175, -44.967655518),
    ]]
    fillet(fillet1_edges, radius=FILLET1_R)


solid = part.part
